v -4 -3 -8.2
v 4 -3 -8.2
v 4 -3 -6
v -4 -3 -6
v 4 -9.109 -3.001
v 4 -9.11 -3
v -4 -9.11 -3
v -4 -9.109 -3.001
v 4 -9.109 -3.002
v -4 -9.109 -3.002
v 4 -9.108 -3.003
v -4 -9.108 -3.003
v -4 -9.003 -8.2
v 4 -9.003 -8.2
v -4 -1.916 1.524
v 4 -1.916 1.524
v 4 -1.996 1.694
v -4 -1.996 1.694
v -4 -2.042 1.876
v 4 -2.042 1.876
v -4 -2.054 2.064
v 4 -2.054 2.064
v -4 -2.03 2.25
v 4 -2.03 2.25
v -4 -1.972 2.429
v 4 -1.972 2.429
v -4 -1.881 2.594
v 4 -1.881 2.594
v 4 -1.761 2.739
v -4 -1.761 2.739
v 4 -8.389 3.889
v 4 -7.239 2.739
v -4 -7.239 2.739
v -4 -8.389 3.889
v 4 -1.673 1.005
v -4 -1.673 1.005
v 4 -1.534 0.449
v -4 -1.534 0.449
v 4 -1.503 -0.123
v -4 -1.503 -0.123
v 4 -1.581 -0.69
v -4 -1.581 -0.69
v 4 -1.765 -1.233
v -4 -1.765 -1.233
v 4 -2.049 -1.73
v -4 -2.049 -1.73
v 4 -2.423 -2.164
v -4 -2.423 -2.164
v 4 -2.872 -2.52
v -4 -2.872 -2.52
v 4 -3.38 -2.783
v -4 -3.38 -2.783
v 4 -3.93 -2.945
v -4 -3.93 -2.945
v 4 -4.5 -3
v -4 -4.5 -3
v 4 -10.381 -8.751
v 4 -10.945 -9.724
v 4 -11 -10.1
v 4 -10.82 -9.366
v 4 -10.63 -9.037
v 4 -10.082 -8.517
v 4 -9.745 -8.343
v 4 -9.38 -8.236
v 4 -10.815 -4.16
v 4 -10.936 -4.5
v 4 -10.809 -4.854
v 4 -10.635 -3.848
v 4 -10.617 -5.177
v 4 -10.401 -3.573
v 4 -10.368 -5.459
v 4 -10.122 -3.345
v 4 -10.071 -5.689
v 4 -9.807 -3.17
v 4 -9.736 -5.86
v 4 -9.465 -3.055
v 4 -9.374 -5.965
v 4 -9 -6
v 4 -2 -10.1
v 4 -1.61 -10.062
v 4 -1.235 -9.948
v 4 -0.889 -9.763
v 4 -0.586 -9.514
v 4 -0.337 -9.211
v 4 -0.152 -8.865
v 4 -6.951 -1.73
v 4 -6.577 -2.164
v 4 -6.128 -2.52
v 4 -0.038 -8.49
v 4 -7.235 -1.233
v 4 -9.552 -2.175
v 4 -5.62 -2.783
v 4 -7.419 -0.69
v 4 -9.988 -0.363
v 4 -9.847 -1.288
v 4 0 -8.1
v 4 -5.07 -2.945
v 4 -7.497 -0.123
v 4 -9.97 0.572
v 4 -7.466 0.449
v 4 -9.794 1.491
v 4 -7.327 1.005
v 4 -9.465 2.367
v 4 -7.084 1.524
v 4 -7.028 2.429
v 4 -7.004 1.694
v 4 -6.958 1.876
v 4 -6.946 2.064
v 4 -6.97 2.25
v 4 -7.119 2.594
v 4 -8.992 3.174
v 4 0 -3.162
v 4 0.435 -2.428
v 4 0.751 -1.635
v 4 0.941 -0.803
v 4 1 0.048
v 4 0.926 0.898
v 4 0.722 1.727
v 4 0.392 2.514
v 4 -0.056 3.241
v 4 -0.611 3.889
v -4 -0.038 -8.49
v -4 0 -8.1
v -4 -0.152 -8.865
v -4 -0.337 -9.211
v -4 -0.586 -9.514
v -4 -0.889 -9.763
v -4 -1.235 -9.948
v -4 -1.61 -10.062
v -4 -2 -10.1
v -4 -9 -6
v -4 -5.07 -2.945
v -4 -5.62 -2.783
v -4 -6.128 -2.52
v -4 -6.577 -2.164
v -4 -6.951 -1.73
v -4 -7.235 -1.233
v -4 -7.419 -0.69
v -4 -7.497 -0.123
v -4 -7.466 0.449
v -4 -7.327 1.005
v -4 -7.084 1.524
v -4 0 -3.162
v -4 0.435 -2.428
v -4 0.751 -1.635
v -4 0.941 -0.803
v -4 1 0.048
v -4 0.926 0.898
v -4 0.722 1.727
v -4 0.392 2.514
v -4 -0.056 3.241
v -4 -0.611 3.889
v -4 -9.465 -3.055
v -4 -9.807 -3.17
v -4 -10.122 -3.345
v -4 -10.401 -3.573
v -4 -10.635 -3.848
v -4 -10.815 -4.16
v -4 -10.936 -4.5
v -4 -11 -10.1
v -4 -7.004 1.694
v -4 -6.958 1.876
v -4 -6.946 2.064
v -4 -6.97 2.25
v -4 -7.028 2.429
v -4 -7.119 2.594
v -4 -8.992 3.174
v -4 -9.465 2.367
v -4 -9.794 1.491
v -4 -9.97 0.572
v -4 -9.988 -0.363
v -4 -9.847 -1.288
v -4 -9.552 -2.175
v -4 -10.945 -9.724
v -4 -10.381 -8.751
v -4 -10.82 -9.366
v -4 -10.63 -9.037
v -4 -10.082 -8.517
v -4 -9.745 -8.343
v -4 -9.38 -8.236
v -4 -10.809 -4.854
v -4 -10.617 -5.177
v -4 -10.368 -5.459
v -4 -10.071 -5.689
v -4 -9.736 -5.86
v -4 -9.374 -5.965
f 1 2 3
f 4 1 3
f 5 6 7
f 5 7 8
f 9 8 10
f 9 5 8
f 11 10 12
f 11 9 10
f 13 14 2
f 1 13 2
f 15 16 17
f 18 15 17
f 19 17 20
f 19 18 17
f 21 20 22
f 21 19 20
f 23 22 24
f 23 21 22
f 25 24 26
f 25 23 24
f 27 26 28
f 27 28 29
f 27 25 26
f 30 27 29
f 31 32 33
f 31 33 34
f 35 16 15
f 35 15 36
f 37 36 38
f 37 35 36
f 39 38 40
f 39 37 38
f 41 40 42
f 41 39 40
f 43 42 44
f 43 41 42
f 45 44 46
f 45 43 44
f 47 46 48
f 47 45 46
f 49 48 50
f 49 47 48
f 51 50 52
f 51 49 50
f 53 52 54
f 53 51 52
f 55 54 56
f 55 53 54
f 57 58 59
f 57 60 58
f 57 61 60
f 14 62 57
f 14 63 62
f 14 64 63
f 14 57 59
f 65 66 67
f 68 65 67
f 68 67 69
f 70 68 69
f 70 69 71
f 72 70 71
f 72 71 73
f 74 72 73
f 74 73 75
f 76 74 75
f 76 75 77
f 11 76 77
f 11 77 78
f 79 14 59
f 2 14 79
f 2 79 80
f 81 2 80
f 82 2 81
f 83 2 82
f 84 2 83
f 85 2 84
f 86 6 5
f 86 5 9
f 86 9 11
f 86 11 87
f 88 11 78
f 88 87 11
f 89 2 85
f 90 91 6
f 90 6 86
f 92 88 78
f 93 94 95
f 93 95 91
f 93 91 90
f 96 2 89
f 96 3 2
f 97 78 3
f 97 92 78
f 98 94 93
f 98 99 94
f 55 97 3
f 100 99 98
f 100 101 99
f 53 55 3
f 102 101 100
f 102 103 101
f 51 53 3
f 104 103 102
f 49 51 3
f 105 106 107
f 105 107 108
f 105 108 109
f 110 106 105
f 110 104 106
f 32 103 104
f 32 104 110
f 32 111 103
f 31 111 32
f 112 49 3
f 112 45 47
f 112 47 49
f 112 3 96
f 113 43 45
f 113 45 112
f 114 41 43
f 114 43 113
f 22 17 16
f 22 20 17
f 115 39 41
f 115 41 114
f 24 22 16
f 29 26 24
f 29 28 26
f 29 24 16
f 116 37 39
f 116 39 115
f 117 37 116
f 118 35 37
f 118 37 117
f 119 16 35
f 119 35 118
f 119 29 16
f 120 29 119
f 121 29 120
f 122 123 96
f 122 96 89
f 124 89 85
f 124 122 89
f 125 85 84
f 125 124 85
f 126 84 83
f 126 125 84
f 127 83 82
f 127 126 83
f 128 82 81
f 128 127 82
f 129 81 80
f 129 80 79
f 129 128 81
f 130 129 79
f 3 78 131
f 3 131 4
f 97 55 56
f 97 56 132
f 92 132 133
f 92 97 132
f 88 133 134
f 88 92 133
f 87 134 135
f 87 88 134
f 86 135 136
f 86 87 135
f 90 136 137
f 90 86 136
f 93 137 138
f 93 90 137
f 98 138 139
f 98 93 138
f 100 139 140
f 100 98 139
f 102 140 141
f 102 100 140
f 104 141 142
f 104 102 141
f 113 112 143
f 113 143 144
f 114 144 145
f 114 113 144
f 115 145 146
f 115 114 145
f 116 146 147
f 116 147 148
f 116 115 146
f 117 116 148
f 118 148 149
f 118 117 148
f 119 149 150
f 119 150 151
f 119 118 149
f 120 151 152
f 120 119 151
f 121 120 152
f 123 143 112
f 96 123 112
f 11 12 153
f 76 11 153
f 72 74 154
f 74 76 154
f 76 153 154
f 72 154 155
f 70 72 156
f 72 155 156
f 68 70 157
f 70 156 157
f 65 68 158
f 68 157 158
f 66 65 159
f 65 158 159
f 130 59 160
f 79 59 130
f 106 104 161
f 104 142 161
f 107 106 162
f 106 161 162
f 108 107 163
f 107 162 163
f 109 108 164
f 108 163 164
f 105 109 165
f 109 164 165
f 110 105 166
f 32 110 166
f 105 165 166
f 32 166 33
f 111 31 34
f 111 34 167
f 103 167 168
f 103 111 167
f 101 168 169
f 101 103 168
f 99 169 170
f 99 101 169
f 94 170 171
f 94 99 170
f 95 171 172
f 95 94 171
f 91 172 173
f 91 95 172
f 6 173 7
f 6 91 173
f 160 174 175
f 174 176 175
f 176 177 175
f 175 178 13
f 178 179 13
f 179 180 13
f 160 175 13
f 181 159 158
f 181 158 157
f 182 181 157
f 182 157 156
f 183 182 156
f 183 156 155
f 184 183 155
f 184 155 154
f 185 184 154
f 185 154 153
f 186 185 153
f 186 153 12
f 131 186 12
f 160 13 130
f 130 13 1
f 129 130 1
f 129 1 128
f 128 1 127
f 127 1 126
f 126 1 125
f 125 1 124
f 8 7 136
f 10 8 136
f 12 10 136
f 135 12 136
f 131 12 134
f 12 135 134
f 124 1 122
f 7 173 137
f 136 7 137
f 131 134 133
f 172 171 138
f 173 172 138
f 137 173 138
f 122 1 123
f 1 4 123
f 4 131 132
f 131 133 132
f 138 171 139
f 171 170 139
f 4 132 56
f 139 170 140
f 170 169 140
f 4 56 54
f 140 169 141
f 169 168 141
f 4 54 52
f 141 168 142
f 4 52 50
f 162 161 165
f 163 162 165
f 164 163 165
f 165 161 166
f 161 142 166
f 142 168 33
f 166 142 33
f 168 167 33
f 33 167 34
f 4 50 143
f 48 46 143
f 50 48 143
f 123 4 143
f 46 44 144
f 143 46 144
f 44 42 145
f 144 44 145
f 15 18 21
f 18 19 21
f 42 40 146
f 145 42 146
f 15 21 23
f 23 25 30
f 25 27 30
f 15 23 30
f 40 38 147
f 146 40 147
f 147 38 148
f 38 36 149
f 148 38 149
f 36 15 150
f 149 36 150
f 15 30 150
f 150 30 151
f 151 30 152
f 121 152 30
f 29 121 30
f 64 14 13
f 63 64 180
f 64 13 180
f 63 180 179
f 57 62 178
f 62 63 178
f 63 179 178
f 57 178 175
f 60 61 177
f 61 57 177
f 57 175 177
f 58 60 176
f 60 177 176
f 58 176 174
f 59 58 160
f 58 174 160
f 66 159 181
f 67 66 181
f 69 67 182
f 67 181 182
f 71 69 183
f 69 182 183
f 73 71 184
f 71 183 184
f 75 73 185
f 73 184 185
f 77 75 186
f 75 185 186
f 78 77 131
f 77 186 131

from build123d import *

# Parameters (mm, degrees)
F1_DEPTH    = 4
F2_T1_DEPTH = 10.764079149
F3_W        = 8
F3_H        = 10
F4_DEPTH    = 7
F5_W        = 8
F5_H        = 2.2
F5_W_2      = 11
F5_H_2      = 2.9
F6_DEPTH    = 25
F7_T1_DEPTH = 18
F7_T3_DEPTH = 17.9874921777
F8_W        = 10.9849025458
F8_H        = 7.8663821071
F9_DEPTH    = 25
F11_DEPTH   = 8
F12_R       = 1


# Not quite as in the source:
# - a fillet or chamfer that OpenCascade refuses, or shapes differently, is made with other operations: its cross-section is extruded or revolved along the edge and cut away or added


with BuildPart() as f1:
    # F0 (on Front) → F1 (new body)
    with BuildSketch(Plane.XZ):
        with BuildLine():
            Line((-1.02606043, 2.8190778624), (-1.3680805733, 3.7587704831))
            ThreePointArc((-1.3680805733, 3.7587704831), (-3.2766081772, 2.2943057454), (-4, 0))
            Line((-4, 0), (-4, -8))
            Line((-4, -8), (-4, -13))
            Line((-4, -13), (4, -13))
            Line((4, -13), (4, -3))
            Line((4, -3), (4, 0))
            ThreePointArc((4, 0), (3.2766081772, 2.2943057454), (1.3680805733, 3.7587704831))
            Line((1.3680805733, 3.7587704831), (1.02606043, 2.8190778624))
            ThreePointArc((1.02606043, 2.8190778624), (0, -3), (-1.02606043, 2.8190778624))
        make_face()
    extrude(amount=F1_DEPTH)

    # F2: fillet of radius 1 on 2 edges, made by hand

    # F2_s2 → F2_t1 (cut)
    with BuildSketch(Plane.XZ.offset(-3.3820395745)):
        with BuildLine():
            ThreePointArc((-2.5427622285, 3.087775939), (-1.6437981614, 3.280553188), (-0.9673790506, 2.6578520976))
            Line((-0.9673790506, 2.6578520976), (-1.3680805733, 3.7587704831))
            ThreePointArc((-1.3680805733, 3.7587704831), (-1.9839937688, 3.4732936423), (-2.5427622285, 3.087775939))
        make_face()
        with BuildLine():
            ThreePointArc((2.5427622285, 3.087775939), (1.6437981614, 3.280553188), (0.9673790506, 2.6578520976))
            Line((0.9673790506, 2.6578520976), (1.3680805733, 3.7587704831))
            ThreePointArc((1.3680805733, 3.7587704831), (1.9839937688, 3.4732936423), (2.5427622285, 3.087775939))
        make_face()
    extrude(amount=F2_T1_DEPTH, mode=Mode.SUBTRACT)

    # F3 (on face) → F4 (join)
    with BuildSketch(Plane.XZ.offset(4)):
        with Locations((0, -8)):
            Rectangle(F3_W, F3_H)
    extrude(amount=F4_DEPTH)

    # F5 (on face) → F6 (cut)
    with BuildSketch(Plane.YZ.offset(4)):
        with Locations((-7, -7.1)):
            Rectangle(F5_W, F5_H)
        with Locations((-5.5, -11.55)):
            Rectangle(F5_W_2, F5_H_2)
    extrude(amount=-F6_DEPTH, mode=Mode.SUBTRACT)

    # F7: fillet of radius 2 on 4 edges, made by hand

    # F7_s2 → F7_t1 (cut)
    with BuildSketch(Plane.YZ.offset(-9)):
        with BuildLine():
            ThreePointArc((-11, -4), (-10.4142135624, -5.4142135624), (-9, -6))
            Line((-9, -6), (-11, -6))
            Line((-11, -6), (-11, -4))
        make_face()
        with BuildLine():
            ThreePointArc((-9, -3), (-10.4142135624, -3.5857864376), (-11, -5))
            Line((-11, -5), (-11, -3))
            Line((-11, -3), (-9, -3))
        make_face()
        with BuildLine():
            ThreePointArc((0, -8.1), (-0.5857864376, -9.5142135624), (-2, -10.1))
            Line((-2, -10.1), (0, -10.1))
            Line((0, -10.1), (0, -8.1))
        make_face()
    extrude(amount=F7_T1_DEPTH, mode=Mode.SUBTRACT)

    # F7_s4 → F7_t3 (cut)
    with BuildSketch(Plane.YZ.offset(-8.9937460889)):
        with BuildLine():
            ThreePointArc((-9.0025015645, -8.2), (-10.3809064397, -8.7508623254), (-11, -10.1))
            Line((-11, -10.1), (-11, -8.2))
            Line((-11, -8.2), (-9.0025015645, -8.2))
        make_face()
    extrude(amount=F7_T3_DEPTH, mode=Mode.SUBTRACT)

    # F8 (on face) → F9 (cut)
    with BuildSketch(Plane.XZ.offset(4)):
        with Locations((-1.4924512729, 0.9331910536)):
            Rectangle(F8_W, F8_H)
    extrude(amount=-F9_DEPTH, mode=Mode.SUBTRACT)

    # F10 (on face) → F11 (join, through all)
    with BuildSketch(Plane.YZ.offset(4)):
        with BuildLine():
            ThreePointArc((-2.3786796564, 2.1213203436), (-1.7283614025, -1.1480502971), (-4.5, -3))
            Line((-4.5, -3), (-9.1097722286, -3))
            ThreePointArc((-9.1097722286, -3), (-1.0366594684, -4.2726189114), (-0.6109127035, 3.8890872965))
            Line((-0.6109127035, 3.8890872965), (-2.3786796564, 2.1213203436))
        make_face()
        with BuildLine():
            Line((-9.1097722286, -3), (-4.5, -3))
            ThreePointArc((-4.5, -3), (-7.2716385975, -1.1480502971), (-6.6213203436, 2.1213203436))
            Line((-6.6213203436, 2.1213203436), (-8.3890872965, 3.8890872965))
            ThreePointArc((-8.3890872965, 3.8890872965), (-9.9701493811, 0.5722462303), (-9.1097722286, -3))
        make_face()
    extrude(amount=-F11_DEPTH)

    # F12
    f12_edges = [f1.edges().sort_by_distance(p)[0] for p in [
        (0, -2.37868, 2.12132),
        (0, -6.62132, 2.12132),
    ]]
    fillet(f12_edges, radius=F12_R)


solid = f1.part
